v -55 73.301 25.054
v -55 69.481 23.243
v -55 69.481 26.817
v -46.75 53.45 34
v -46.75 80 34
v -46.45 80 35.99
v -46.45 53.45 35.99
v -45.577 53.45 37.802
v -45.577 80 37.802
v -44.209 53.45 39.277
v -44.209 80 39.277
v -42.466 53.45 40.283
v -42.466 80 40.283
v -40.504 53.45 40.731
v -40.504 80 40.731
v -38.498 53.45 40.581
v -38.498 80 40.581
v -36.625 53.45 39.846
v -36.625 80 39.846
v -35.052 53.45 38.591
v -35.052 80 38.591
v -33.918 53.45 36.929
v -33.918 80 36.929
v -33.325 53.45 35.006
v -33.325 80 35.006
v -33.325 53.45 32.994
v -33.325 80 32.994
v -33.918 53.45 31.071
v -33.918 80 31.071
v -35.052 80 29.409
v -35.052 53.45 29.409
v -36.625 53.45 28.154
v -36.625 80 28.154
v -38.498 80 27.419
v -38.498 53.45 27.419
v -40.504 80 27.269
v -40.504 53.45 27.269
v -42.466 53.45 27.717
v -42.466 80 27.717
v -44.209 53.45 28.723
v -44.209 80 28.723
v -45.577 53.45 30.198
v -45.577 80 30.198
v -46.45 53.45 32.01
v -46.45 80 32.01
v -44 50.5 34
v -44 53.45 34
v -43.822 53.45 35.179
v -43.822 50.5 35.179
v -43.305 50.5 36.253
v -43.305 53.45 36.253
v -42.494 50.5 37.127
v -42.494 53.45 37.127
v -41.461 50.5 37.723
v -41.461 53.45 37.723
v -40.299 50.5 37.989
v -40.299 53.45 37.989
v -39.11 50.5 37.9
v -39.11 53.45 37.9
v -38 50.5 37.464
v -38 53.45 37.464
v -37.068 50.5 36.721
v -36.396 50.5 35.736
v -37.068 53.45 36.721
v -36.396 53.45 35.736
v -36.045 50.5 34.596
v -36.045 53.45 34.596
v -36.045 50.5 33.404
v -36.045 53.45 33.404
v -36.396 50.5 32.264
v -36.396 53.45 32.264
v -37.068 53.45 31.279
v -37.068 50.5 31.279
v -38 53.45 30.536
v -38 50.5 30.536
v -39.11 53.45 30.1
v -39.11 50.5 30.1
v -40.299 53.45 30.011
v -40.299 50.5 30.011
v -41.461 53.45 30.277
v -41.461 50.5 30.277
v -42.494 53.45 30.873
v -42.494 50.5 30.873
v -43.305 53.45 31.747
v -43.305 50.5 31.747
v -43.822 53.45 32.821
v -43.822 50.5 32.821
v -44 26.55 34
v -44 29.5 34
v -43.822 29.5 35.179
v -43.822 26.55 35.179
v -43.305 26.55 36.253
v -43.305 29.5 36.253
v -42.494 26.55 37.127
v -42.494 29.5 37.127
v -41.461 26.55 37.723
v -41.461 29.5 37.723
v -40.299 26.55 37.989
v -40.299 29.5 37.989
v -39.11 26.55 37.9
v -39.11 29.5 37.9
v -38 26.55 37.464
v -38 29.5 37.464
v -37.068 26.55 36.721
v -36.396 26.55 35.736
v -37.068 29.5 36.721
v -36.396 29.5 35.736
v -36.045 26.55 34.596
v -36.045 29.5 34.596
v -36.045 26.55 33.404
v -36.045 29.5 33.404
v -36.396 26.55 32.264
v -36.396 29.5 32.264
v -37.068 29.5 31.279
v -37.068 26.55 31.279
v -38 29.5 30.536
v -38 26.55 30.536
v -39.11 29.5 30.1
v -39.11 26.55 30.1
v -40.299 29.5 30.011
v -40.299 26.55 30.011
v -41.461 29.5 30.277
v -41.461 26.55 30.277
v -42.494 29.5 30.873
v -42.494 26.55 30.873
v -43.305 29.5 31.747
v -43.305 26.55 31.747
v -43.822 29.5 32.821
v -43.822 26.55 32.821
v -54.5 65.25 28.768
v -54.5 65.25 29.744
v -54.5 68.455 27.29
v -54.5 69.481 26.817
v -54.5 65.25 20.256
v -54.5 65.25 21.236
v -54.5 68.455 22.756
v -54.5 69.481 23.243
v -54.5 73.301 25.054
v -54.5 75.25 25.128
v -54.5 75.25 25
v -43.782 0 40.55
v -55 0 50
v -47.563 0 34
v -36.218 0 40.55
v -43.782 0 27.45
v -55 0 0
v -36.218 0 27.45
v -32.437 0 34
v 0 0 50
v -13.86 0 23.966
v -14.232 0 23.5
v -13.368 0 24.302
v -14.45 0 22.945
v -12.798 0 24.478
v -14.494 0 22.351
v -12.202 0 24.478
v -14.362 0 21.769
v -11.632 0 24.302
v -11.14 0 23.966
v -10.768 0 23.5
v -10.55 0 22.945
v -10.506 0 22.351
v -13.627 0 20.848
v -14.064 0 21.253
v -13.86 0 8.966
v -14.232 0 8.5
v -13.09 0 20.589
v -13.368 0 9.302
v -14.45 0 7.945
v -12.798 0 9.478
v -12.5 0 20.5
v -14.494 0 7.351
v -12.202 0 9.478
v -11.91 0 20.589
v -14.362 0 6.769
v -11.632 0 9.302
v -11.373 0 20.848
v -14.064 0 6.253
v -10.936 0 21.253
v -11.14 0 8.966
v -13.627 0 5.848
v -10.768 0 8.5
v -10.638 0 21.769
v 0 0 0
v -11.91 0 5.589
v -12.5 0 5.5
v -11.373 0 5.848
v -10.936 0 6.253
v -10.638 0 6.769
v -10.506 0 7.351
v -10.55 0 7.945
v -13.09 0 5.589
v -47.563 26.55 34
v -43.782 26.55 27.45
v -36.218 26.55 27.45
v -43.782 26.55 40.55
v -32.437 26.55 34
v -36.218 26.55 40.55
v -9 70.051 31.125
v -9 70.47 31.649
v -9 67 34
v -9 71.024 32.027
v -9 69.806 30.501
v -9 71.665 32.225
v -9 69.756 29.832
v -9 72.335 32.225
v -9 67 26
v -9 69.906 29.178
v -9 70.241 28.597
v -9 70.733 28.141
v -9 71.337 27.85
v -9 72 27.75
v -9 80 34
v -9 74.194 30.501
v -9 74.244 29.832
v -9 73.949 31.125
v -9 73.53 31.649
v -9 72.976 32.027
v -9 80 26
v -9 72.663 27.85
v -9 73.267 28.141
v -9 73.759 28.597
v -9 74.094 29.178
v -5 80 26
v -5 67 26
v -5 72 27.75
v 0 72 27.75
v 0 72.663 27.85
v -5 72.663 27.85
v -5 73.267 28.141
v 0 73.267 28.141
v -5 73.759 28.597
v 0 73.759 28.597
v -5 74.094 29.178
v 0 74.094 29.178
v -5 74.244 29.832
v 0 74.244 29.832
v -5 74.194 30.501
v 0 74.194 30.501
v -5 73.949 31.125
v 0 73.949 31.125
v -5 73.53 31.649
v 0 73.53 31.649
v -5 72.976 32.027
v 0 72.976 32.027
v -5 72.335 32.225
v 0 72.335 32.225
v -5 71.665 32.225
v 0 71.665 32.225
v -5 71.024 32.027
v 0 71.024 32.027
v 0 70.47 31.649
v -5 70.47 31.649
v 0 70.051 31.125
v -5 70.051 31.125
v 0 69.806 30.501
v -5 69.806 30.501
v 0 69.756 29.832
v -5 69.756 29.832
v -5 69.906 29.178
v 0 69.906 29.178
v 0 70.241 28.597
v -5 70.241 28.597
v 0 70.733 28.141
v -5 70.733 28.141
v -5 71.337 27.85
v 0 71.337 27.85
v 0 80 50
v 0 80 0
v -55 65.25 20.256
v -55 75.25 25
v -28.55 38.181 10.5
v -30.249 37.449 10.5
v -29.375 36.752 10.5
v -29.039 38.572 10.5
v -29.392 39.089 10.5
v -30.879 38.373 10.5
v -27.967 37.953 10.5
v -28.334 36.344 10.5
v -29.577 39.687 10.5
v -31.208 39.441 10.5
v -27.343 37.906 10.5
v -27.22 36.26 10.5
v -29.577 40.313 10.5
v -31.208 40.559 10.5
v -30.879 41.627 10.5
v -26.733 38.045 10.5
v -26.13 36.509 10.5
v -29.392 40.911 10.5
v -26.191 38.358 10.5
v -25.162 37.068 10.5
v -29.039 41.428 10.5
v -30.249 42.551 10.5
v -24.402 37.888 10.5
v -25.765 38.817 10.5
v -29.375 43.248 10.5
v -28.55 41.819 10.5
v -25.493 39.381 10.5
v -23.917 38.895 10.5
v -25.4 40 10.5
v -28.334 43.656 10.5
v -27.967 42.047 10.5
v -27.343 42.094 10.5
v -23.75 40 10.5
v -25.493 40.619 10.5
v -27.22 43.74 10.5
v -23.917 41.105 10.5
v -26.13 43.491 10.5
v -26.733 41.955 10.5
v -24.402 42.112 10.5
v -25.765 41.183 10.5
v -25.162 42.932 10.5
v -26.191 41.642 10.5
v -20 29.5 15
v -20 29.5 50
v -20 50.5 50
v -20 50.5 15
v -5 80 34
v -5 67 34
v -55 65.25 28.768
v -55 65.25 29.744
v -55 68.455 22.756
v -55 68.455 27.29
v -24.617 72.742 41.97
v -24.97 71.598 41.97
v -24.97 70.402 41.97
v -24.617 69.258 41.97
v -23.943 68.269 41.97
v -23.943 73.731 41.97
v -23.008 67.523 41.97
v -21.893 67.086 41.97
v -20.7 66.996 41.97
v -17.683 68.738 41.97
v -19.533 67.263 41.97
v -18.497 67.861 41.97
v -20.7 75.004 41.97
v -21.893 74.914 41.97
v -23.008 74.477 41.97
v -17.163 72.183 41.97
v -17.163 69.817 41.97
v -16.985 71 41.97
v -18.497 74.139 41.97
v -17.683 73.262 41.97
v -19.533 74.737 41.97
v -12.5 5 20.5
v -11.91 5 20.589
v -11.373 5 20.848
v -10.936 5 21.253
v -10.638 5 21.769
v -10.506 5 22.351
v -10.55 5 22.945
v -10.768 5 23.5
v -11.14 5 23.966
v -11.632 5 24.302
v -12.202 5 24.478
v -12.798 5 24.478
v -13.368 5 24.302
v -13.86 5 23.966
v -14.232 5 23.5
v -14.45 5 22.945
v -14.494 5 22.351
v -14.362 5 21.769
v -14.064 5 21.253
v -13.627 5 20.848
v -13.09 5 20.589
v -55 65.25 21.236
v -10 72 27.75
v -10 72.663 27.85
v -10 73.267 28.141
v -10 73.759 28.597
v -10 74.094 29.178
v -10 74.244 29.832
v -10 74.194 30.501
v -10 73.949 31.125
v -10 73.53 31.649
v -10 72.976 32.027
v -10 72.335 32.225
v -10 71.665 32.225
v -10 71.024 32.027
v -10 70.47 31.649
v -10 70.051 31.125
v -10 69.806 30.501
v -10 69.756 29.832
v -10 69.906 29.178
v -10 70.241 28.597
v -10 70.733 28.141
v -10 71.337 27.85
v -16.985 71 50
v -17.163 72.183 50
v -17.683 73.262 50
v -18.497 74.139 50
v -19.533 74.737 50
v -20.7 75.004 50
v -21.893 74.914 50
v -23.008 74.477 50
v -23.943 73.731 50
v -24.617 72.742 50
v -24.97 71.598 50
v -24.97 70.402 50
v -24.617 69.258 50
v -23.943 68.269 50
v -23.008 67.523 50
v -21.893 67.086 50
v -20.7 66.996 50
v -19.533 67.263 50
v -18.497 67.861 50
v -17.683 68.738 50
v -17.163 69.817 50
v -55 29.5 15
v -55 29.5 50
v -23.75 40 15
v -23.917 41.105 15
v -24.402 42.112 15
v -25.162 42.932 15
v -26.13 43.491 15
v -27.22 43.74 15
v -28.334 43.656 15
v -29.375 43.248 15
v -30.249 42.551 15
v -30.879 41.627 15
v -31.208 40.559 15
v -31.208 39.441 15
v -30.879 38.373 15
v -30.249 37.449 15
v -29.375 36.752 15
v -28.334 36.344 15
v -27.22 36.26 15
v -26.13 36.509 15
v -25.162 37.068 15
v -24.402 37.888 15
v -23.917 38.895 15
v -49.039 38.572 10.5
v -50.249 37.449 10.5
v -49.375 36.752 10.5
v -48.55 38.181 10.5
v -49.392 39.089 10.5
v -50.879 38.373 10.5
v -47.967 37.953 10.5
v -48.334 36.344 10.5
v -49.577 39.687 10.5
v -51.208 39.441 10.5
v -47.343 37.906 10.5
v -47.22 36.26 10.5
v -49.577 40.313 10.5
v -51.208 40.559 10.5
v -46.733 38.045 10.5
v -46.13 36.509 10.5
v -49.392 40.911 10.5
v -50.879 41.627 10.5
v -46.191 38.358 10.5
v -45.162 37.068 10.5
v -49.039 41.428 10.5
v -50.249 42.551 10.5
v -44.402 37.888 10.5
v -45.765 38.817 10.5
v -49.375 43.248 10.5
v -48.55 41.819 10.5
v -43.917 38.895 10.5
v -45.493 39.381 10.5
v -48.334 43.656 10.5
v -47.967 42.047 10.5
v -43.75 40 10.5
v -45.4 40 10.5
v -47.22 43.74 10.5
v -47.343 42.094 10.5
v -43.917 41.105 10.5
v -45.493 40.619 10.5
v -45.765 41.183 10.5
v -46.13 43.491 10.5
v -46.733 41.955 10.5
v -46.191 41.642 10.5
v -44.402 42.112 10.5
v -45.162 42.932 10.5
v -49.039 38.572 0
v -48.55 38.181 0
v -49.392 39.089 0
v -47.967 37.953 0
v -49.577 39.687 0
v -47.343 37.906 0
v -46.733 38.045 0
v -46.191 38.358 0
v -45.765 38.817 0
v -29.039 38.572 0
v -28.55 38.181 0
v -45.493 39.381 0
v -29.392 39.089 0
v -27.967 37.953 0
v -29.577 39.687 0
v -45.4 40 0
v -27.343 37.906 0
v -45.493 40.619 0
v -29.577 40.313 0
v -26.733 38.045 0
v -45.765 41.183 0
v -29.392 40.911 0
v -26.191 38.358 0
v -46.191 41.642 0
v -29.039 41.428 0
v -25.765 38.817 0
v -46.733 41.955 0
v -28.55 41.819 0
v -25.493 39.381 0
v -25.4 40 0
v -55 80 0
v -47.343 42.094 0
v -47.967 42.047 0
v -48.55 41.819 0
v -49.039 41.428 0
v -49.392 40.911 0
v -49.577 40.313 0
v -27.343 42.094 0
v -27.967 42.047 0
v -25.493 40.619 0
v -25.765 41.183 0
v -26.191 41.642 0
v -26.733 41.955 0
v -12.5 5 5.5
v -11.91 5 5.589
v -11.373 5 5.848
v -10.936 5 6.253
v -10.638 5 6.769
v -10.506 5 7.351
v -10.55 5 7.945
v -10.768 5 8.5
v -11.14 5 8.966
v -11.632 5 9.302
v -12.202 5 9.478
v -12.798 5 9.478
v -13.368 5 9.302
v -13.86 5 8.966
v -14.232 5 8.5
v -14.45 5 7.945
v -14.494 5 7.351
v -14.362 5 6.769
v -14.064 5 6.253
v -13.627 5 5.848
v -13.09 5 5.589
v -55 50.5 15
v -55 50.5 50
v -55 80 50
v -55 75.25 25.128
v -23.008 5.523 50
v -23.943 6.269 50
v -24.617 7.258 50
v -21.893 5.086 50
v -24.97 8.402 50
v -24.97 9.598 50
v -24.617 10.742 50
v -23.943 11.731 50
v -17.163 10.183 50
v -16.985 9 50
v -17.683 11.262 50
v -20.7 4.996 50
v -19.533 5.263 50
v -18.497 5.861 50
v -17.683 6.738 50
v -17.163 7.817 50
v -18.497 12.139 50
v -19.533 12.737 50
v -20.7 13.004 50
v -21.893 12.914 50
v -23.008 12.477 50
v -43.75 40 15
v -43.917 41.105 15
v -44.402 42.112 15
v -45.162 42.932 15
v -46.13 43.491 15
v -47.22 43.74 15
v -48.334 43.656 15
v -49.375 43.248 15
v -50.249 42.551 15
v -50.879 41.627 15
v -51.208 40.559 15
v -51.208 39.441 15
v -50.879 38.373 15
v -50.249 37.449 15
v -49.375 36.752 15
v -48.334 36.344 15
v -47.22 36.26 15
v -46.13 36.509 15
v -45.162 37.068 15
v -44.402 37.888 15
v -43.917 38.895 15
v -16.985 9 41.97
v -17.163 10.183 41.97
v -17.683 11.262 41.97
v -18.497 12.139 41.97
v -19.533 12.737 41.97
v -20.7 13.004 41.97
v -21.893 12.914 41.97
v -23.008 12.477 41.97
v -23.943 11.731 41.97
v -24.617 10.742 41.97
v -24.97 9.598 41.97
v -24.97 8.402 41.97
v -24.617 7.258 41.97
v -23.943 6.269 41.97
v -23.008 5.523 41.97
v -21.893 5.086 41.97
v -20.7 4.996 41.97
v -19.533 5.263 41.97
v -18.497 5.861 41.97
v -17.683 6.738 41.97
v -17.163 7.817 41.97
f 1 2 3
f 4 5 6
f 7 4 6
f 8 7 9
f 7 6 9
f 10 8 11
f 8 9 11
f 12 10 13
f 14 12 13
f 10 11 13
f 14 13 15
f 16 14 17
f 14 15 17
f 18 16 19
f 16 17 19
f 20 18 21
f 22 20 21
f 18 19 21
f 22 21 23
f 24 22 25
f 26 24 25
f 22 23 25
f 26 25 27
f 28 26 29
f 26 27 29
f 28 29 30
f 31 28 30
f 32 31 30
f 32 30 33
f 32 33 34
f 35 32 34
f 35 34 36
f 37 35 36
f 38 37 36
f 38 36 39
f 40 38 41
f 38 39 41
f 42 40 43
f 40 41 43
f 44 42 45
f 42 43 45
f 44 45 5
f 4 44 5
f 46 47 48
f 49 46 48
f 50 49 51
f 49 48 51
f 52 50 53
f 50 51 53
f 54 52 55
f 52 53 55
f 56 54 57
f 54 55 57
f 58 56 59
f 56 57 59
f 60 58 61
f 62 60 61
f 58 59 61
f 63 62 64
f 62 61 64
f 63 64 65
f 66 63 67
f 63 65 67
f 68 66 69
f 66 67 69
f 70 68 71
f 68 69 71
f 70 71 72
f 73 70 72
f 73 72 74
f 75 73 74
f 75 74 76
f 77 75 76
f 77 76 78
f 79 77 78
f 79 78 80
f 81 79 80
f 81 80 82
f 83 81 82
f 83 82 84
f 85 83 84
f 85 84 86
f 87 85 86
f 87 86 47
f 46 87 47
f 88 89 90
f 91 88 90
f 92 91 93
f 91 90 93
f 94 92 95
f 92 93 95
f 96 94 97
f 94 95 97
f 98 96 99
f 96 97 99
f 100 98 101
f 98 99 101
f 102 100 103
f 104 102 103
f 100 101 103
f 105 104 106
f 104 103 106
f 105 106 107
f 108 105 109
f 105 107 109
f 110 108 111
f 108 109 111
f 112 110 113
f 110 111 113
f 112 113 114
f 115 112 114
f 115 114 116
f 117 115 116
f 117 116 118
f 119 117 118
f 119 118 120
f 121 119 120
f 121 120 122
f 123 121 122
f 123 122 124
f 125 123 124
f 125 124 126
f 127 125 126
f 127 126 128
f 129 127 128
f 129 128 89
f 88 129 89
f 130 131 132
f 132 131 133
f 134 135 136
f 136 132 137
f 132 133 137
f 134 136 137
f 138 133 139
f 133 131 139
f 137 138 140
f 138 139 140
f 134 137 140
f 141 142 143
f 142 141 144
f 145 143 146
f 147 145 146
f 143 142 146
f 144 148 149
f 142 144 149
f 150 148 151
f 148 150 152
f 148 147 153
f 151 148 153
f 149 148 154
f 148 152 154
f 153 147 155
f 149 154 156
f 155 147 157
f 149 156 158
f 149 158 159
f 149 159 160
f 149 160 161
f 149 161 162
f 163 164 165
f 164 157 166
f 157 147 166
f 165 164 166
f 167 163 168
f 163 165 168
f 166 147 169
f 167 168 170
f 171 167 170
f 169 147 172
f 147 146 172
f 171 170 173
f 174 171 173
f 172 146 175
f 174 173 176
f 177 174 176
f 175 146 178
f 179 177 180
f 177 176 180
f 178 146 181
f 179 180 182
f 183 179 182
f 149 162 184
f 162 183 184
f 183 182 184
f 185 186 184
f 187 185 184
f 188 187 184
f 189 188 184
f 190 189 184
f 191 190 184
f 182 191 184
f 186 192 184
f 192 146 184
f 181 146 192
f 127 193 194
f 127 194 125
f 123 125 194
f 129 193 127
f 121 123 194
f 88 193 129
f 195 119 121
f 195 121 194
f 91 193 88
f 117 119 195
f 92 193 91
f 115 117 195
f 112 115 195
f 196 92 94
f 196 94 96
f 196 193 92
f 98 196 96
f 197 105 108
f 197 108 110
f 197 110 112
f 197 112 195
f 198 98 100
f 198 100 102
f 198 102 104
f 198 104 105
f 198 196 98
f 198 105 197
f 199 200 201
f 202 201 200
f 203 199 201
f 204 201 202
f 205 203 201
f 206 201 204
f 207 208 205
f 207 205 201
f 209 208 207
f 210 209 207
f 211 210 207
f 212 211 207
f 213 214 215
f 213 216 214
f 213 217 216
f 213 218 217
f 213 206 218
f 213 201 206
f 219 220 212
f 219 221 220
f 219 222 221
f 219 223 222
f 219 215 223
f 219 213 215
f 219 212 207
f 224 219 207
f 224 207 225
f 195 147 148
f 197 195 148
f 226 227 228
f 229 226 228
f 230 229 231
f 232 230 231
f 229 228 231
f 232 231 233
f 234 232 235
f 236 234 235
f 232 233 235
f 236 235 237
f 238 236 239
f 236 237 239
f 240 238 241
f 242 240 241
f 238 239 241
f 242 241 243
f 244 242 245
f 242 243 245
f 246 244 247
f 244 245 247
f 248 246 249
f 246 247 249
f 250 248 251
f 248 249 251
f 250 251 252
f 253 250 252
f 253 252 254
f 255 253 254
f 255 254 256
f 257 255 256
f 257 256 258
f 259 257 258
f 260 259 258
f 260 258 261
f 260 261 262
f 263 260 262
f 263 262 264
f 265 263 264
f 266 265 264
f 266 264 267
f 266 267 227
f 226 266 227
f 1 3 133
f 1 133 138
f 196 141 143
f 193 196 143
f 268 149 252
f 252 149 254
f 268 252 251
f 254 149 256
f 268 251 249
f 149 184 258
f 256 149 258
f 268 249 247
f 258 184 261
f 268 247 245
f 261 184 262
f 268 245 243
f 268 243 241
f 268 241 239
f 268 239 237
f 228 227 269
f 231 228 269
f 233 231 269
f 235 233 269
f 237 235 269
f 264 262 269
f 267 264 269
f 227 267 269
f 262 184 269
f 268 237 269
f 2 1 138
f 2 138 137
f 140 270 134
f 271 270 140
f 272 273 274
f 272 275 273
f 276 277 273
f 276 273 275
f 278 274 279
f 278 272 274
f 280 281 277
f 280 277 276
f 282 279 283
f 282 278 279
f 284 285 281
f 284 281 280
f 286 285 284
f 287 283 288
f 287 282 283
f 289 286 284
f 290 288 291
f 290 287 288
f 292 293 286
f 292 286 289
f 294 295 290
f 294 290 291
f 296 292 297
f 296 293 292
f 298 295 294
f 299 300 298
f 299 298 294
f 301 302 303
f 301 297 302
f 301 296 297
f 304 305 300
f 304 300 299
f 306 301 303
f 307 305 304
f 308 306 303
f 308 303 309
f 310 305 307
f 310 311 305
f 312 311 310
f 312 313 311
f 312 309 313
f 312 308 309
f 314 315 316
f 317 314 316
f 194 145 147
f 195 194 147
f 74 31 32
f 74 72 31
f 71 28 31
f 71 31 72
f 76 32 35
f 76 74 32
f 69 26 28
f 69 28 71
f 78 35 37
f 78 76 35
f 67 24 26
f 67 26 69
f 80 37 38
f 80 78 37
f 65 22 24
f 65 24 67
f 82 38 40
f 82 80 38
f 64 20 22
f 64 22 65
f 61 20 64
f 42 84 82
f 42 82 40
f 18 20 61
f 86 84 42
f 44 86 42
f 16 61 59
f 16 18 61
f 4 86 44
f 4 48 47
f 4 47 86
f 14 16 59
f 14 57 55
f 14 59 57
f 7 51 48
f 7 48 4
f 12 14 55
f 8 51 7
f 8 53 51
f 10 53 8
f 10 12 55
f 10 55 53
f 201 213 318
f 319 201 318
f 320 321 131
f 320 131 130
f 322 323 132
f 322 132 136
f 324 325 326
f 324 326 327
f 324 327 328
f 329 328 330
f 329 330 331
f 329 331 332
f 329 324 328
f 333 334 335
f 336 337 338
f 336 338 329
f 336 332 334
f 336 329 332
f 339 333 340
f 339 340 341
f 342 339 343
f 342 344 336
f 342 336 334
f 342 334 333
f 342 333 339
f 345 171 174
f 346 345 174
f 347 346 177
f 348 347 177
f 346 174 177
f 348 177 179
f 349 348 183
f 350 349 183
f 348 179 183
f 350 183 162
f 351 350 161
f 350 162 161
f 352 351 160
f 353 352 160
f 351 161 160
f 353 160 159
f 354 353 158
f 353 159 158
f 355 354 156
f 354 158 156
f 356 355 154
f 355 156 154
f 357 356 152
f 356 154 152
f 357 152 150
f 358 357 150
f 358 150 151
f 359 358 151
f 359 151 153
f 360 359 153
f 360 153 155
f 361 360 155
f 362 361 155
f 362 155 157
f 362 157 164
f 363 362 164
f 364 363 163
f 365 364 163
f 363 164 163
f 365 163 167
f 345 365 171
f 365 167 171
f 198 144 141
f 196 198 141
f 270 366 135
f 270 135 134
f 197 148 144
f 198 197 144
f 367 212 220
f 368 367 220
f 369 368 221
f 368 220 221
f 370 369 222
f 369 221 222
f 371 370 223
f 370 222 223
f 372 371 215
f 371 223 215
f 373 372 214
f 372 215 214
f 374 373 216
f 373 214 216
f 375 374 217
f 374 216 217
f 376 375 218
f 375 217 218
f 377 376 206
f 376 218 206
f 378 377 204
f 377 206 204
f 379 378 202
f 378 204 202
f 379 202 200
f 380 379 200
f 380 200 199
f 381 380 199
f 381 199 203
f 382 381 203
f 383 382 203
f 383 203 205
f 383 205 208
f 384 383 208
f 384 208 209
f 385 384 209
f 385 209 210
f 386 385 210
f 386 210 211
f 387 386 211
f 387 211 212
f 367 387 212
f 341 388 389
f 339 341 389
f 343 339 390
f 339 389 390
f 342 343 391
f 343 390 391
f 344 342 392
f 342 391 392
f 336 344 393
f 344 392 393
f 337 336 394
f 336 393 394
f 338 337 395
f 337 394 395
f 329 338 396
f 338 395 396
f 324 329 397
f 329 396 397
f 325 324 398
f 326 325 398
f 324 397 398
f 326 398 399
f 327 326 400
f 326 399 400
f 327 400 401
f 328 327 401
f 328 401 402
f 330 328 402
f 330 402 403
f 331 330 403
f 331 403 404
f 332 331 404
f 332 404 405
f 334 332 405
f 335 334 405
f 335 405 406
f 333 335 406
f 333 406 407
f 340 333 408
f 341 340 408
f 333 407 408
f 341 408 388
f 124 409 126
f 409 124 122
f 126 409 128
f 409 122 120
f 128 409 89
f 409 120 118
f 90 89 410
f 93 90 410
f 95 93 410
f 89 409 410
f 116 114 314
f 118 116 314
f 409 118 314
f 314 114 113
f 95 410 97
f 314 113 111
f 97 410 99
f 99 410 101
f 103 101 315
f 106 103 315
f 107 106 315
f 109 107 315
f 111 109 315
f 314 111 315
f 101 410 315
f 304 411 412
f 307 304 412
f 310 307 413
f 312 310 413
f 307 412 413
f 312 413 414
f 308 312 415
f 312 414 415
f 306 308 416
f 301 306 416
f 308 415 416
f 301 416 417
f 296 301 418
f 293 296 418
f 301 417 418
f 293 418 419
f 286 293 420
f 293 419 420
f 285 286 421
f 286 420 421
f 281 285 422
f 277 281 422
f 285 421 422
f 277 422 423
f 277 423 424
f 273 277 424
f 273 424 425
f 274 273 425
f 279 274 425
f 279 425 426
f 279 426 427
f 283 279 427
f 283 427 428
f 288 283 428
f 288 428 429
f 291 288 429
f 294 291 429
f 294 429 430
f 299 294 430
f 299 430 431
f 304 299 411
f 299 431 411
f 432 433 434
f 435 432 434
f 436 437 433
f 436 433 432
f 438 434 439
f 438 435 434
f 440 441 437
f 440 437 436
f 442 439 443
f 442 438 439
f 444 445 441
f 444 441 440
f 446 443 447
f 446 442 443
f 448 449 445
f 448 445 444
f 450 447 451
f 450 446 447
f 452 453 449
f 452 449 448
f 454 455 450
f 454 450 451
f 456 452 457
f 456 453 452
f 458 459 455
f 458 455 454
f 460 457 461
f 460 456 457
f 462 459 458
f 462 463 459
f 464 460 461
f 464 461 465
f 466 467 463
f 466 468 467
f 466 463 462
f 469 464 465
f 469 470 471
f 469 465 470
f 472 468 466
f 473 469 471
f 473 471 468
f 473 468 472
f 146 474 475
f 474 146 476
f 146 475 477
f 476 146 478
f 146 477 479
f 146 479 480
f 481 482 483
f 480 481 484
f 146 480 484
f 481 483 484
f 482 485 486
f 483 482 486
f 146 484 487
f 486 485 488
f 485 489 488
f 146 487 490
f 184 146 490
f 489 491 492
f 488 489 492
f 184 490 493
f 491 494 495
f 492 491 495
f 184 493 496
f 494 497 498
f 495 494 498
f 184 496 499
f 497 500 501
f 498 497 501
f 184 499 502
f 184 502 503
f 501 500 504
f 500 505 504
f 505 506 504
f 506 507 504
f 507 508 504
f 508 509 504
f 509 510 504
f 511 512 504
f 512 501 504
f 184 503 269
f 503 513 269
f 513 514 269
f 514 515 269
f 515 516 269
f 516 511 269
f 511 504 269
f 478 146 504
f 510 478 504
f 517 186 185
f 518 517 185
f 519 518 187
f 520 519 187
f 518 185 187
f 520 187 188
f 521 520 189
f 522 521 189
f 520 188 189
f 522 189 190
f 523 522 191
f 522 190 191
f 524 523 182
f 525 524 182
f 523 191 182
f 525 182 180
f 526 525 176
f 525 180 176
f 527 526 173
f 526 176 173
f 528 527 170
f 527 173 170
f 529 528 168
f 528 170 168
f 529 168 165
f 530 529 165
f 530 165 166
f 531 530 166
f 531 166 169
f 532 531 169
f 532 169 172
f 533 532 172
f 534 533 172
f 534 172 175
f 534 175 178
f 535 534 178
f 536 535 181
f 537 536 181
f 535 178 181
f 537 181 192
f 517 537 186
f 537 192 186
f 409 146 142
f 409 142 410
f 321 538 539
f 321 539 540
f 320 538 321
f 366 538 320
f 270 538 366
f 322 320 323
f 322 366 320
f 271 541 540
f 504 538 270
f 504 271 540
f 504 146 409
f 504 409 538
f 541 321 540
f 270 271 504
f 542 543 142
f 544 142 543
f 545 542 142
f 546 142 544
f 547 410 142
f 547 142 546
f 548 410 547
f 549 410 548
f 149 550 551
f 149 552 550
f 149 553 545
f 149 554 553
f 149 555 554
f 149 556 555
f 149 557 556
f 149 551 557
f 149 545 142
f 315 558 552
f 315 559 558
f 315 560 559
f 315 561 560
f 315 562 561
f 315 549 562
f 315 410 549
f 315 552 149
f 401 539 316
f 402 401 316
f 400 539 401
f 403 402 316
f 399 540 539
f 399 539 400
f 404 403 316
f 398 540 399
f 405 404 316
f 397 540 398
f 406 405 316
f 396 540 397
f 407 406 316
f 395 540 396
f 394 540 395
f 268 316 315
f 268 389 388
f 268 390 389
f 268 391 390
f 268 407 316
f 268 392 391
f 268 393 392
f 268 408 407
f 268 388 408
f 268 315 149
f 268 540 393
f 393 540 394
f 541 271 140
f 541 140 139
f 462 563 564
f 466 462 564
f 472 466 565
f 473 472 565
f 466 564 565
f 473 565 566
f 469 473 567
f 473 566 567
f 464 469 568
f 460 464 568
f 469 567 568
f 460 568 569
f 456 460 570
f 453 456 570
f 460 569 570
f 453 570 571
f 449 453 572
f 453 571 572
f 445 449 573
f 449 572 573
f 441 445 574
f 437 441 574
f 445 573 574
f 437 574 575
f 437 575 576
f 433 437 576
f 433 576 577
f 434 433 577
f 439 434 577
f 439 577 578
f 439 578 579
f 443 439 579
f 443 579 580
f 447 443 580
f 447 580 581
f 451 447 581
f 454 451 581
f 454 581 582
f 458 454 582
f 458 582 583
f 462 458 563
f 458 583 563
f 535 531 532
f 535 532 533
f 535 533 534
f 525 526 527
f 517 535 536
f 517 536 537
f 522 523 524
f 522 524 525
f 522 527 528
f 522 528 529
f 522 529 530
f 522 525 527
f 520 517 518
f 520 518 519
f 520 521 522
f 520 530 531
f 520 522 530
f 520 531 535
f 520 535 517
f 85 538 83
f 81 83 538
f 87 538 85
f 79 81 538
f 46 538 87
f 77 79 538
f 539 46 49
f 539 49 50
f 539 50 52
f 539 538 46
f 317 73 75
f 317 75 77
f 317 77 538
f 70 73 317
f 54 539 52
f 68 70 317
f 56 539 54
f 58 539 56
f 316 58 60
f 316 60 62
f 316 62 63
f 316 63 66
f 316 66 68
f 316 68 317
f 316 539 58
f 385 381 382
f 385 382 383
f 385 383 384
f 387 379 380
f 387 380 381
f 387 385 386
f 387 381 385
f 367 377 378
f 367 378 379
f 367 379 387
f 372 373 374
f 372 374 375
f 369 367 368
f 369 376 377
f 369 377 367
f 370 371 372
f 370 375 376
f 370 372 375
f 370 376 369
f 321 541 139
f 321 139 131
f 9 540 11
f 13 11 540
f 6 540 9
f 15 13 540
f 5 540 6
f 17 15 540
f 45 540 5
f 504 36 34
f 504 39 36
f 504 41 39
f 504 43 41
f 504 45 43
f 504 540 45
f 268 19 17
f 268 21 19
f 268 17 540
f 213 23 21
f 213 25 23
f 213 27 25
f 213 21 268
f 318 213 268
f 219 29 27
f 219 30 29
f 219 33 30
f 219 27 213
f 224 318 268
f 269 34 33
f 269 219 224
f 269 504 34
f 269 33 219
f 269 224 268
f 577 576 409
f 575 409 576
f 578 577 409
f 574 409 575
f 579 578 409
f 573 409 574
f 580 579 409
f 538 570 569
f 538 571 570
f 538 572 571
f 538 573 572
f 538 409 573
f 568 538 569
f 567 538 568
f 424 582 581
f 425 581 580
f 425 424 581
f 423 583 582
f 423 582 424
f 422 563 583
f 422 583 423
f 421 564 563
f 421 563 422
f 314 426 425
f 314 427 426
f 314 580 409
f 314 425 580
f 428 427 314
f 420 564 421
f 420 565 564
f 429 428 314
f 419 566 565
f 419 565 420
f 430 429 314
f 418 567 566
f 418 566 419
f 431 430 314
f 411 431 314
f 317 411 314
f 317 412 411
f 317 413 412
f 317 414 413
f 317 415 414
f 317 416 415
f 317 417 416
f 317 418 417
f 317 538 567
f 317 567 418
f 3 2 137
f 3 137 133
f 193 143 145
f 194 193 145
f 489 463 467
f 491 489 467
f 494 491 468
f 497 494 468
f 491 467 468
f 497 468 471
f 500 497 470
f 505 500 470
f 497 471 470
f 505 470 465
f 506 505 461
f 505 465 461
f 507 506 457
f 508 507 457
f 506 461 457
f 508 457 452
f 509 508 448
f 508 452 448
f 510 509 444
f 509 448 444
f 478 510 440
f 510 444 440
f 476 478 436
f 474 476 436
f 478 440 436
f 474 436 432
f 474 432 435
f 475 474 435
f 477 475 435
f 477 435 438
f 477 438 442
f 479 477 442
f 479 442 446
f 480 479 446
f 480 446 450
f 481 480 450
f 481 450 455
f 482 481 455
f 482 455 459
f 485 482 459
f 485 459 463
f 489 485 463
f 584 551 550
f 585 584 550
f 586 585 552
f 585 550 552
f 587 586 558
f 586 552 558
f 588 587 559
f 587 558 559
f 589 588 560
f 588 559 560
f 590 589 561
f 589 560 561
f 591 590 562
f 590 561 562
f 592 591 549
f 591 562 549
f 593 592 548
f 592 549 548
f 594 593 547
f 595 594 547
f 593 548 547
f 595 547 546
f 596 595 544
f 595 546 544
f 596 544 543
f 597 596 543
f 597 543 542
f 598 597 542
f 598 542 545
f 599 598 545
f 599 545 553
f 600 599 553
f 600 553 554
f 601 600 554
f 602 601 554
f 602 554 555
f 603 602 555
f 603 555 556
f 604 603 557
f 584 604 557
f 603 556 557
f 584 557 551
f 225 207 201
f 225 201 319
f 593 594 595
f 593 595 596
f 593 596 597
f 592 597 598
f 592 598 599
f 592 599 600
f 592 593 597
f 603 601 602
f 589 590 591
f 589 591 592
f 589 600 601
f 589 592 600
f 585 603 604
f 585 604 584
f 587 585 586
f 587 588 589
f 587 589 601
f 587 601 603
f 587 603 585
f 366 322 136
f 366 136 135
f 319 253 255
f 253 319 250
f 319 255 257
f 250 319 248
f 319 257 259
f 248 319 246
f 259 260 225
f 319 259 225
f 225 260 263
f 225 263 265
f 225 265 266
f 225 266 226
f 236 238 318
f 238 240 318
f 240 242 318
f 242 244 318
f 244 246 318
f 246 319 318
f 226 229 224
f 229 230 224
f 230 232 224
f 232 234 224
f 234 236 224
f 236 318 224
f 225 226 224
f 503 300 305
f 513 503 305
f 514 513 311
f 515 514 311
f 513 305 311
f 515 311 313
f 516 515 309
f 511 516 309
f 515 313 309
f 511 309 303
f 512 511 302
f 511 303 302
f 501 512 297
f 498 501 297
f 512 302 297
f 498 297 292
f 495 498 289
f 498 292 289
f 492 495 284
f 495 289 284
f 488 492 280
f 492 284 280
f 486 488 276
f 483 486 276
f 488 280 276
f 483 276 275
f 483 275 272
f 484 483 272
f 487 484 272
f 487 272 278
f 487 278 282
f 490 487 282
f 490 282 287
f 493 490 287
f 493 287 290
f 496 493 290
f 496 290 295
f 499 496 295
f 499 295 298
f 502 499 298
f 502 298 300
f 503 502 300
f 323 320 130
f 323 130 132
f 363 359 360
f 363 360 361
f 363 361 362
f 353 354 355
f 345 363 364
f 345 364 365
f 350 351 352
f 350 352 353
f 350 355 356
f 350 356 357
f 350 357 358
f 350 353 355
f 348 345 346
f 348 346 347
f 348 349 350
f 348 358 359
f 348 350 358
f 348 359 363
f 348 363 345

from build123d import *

# Parameters (mm, degrees)
SKETCH1_W           = 55
SKETCH1_H           = 80
BOSS_EXTRUDE1_DEPTH = 50
SKETCH2_R           = 4
CUT_EXTRUDE1_DEPTH  = 110.201648339
SKETCH3_R           = 4.015
CUT_EXTRUDE2_DEPTH  = 8.03
SKETCH4_W           = 35
SKETCH4_H           = 21
CUT_EXTRUDE3_DEPTH  = 35
SKETCH8_R           = 6.75
CUT_EXTRUDE5_DEPTH  = 26.55
CUT_EXTRUDE6_DEPTH  = 26.55
SKETCH10_R          = 2
CUT_EXTRUDE7_DEPTH  = 5
SKETCH12_R          = 2.1
CUT_EXTRUDE8_DEPTH  = 104.198837203
SKETCH12_3_R        = 3.75
CUT_EXTRUDE9_DEPTH  = 4.5
SKETCH13_R          = 2.25
CUT_EXTRUDE10_DEPTH = 10
SKETCH14_W          = 4
SKETCH14_H          = 8
CUT_EXTRUDE11_DEPTH = 13
CUT_EXTRUDE12_DEPTH = 0.5


with BuildPart() as part:
    # Sketch1 → Boss-Extrude1 (new body)
    with BuildSketch(Plane.XY):
        with Locations((-27.5, 40)):
            Rectangle(SKETCH1_W, SKETCH1_H)
    extrude(amount=BOSS_EXTRUDE1_DEPTH)

    # Sketch2 → Cut-Extrude1 (cut, through all)
    with BuildSketch(Plane(origin=(0, 80, 0), x_dir=(1, 0, 0), z_dir=(0, 1, 0))):
        with Locations(Location((-40, -34, 0), (0, 0, 180))):
            Circle(SKETCH2_R)
    extrude(amount=-CUT_EXTRUDE1_DEPTH, mode=Mode.SUBTRACT)

    # Sketch3 → Cut-Extrude2 (cut)
    with BuildSketch(Plane.XY.offset(50)):
        with Locations((-21, 71)):
            Circle(SKETCH3_R)
        with Locations((-21, 9)):
            Circle(SKETCH3_R)
    extrude(amount=-CUT_EXTRUDE2_DEPTH, mode=Mode.SUBTRACT)

    # Sketch4 → Cut-Extrude3 (cut)
    with BuildSketch(Plane.XY.offset(50)):
        with Locations((-37.5, 40)):
            Rectangle(SKETCH4_W, SKETCH4_H)
    extrude(amount=-CUT_EXTRUDE3_DEPTH, mode=Mode.SUBTRACT)

    # Sketch8 → Cut-Extrude5 (cut)
    with BuildSketch(Plane(origin=(0, 80, 0), x_dir=(1, 0, 0), z_dir=(0, 1, 0))):
        with Locations(Location((-40, -34, 0), (0, 0, 180))):
            Circle(SKETCH8_R)
    extrude(amount=-CUT_EXTRUDE5_DEPTH, mode=Mode.SUBTRACT)

    # Sketch9 → Cut-Extrude6 (cut)
    with BuildSketch(Plane.XZ):
        Polygon((-32.436711474, 34), (-36.218355737, 40.55), (-43.781644263, 40.55), (-47.563288526, 34), (-43.781644263, 27.45), (-36.218355737, 27.45), align=None)
    extrude(amount=-CUT_EXTRUDE6_DEPTH, mode=Mode.SUBTRACT)

    # Sketch10 → Cut-Extrude7 (cut)
    with BuildSketch(Plane.XZ):
        with Locations(Location((-12.5, 7.5, 0), (0, 0, 270))):
            Circle(SKETCH10_R)
        with Locations(Location((-12.5, 22.5, 0), (0, 0, 270))):
            Circle(SKETCH10_R)
    extrude(amount=-CUT_EXTRUDE7_DEPTH, mode=Mode.SUBTRACT)

    # Sketch12 → Cut-Extrude8 (cut, through all)
    with BuildSketch(Plane.XY.offset(15)):
        with Locations((-47.5, 40)):
            Circle(SKETCH12_R)
        with BuildLine():
            ThreePointArc((-29.6, 40), (-27.5, 37.9), (-25.4, 40))
            Line((-25.4, 40), (-29.6, 40))
        make_face()
        with BuildLine():
            Line((-29.6, 40), (-25.4, 40))
            ThreePointArc((-25.4, 40), (-27.5, 42.1), (-29.6, 40))
        make_face()
    extrude(amount=-CUT_EXTRUDE8_DEPTH, mode=Mode.SUBTRACT)

    # Sketch12<3> → Cut-Extrude9 (cut)
    with BuildSketch(Plane.XY.offset(15)):
        with BuildLine():
            ThreePointArc((-31.25, 40), (-27.5, 36.25), (-23.75, 40))
            Line((-23.75, 40), (-25.4, 40))
            ThreePointArc((-25.4, 40), (-27.5, 37.9), (-29.6, 40))
            Line((-29.6, 40), (-31.25, 40))
        make_face()
        with BuildLine():
            Line((-25.4, 40), (-23.75, 40))
            ThreePointArc((-23.75, 40), (-27.5, 43.75), (-31.25, 40))
            Line((-31.25, 40), (-29.6, 40))
            ThreePointArc((-29.6, 40), (-27.5, 42.1), (-25.4, 40))
        make_face()
        with Locations((-47.5, 40)):
            Circle(SKETCH12_3_R)
    extrude(amount=-CUT_EXTRUDE9_DEPTH, mode=Mode.SUBTRACT)

    # Sketch13 → Cut-Extrude10 (cut)
    with BuildSketch(Plane(origin=(0, 0, 0), x_dir=(0, 0, -1), z_dir=(1, 0, 0))):
        with Locations((-30, 72)):
            Circle(SKETCH13_R)
    extrude(amount=-CUT_EXTRUDE10_DEPTH, mode=Mode.SUBTRACT)

    # Sketch14 → Cut-Extrude11 (cut)
    with BuildSketch(Plane(origin=(0, 80, 0), x_dir=(1, 0, 0), z_dir=(0, 1, 0))):
        with Locations((-7, -30)):
            Rectangle(SKETCH14_W, SKETCH14_H)
    extrude(amount=-CUT_EXTRUDE11_DEPTH, mode=Mode.SUBTRACT)

    # Sketch15 → Cut-Extrude12 (cut)
    with BuildSketch(Plane.ZY.offset(55)):
        Polygon((25.128205128, 75.25), (29.743589744, 65.25), (28.768028846, 65.25), (27.289663462, 68.455128205), (22.756410256, 68.455128205), (21.235977564, 65.25), (20.256410256, 65.25), (25, 75.25), align=None)
        Polygon((25.054086538, 73.30088141), (23.243189103, 69.480769231), (26.816907051, 69.480769231), align=None, mode=Mode.SUBTRACT)
    extrude(amount=-CUT_EXTRUDE12_DEPTH, mode=Mode.SUBTRACT)


solid = part.part
